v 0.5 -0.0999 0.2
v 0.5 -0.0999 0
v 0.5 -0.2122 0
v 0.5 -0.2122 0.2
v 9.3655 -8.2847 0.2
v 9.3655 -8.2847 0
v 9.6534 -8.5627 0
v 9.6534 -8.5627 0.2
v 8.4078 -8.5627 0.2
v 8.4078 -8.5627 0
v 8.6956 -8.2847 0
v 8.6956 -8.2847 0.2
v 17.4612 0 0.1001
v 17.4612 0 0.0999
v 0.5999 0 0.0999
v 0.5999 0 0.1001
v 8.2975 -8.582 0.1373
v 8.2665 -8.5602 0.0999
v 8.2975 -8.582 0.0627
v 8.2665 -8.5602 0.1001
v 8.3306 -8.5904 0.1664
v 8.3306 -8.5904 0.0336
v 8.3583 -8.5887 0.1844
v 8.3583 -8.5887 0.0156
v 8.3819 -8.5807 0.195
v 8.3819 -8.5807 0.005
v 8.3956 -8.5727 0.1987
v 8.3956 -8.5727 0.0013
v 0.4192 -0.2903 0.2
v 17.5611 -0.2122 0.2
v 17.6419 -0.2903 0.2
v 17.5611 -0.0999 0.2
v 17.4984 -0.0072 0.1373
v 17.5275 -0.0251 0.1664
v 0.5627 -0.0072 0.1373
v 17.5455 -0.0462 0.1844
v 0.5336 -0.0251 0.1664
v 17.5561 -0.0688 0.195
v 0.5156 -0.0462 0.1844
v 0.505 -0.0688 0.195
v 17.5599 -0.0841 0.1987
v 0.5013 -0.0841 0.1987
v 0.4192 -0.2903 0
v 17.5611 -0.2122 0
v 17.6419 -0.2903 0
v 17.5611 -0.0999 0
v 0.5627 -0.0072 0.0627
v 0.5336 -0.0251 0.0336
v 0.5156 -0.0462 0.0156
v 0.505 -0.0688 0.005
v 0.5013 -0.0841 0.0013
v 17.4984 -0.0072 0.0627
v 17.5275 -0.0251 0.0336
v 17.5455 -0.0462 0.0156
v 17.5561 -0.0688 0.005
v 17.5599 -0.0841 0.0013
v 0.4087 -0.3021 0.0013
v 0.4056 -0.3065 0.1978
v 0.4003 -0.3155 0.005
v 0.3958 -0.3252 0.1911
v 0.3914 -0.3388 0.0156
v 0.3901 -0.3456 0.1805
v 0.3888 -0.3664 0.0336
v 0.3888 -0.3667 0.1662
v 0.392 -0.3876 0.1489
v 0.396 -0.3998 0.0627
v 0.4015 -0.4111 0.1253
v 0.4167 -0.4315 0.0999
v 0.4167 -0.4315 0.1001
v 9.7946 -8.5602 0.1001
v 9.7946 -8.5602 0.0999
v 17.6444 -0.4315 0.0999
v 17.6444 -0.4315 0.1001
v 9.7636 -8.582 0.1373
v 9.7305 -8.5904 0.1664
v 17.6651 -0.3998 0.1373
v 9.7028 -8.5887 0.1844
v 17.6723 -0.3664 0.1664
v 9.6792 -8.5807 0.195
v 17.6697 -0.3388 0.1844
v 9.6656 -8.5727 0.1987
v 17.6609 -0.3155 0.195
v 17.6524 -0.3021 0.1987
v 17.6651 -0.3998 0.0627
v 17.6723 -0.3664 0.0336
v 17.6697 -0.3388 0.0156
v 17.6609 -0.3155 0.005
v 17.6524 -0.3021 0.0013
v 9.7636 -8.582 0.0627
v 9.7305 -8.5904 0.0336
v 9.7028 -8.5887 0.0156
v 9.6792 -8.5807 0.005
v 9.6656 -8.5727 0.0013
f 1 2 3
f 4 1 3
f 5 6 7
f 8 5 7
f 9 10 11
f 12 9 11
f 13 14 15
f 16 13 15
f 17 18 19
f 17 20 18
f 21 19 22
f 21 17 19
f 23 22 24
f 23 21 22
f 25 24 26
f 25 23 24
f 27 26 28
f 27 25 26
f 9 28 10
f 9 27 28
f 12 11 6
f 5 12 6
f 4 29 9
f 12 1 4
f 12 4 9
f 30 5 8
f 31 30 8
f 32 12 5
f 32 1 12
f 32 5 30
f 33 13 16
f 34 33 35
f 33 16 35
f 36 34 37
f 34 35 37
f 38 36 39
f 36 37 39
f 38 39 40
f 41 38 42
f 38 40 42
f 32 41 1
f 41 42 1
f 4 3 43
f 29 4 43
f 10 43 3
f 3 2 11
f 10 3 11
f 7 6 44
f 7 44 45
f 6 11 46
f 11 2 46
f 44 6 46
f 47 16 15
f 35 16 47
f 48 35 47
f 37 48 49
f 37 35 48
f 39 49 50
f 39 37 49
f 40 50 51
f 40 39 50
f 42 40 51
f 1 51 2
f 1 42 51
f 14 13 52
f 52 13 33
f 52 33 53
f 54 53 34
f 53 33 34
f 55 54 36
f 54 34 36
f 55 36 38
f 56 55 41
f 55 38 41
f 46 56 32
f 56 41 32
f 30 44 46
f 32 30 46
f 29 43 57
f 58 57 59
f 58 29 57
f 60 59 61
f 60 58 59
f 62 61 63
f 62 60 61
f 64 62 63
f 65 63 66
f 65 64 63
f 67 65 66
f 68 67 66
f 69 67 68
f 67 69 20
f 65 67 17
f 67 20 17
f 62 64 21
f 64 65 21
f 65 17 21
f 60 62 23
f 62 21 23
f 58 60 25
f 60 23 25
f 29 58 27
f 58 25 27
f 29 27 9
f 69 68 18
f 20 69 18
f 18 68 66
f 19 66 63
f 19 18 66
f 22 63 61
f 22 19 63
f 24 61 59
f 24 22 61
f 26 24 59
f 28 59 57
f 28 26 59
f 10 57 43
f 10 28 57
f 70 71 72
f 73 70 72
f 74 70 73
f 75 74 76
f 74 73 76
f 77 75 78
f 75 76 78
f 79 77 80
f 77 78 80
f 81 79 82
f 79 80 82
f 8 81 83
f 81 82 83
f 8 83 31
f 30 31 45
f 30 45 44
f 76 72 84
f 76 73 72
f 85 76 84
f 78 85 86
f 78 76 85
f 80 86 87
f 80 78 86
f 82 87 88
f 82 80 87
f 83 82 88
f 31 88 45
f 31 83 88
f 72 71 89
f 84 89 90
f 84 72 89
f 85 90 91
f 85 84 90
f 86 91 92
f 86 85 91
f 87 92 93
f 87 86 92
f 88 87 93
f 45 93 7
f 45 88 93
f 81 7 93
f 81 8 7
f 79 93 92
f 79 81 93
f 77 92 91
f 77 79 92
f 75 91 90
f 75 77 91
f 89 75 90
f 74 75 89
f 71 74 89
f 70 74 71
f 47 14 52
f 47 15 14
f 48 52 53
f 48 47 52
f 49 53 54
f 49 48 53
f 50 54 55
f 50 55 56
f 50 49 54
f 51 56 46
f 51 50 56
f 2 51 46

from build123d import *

# Parameters (mm, degrees)
EXTRUDE_1_DEPTH = 0.2
FILLET_1_R      = 0.1


with BuildPart() as part:
    # 草图1 → 凸台-拉伸1 (new body)
    with BuildSketch(Plane.XY):
        Polygon((17.561117632, 0), (0.5, 0), (0.5, -0.212237408), (0.347329185, -0.3596699), (8.335900446, -8.632077604), (8.695570346, -8.284748419), (9.365547286, -8.284748419), (9.725217186, -8.632077604), (17.713788447, -0.3596699), (17.561117632, -0.212237408), align=None)
    extrude(amount=EXTRUDE_1_DEPTH)

    # 圆角1
    fillet_1_edges = [part.edges().sort_by_distance(p)[0] for p in [
        (4.341614815, -4.495873752, 0),
        (9.030558816, 0, 0),
        (13.719502817, -4.495873752, 0),
        (13.719502817, -4.495873752, 0.2),
        (8.335900446, -8.632077604, 0.1),
        (0.347329185, -0.3596699, 0.1),
        (0.5, 0, 0.1),
        (17.561117632, 0, 0.1),
        (17.713788447, -0.3596699, 0.1),
        (9.725217186, -8.632077604, 0.1),
        (9.030558816, 0, 0.2),
        (4.341614815, -4.495873752, 0.2),
    ]]
    fillet(fillet_1_edges, radius=FILLET_1_R - 0.0001)  # a hair under: the kernel refuses the full size


solid = part.part
